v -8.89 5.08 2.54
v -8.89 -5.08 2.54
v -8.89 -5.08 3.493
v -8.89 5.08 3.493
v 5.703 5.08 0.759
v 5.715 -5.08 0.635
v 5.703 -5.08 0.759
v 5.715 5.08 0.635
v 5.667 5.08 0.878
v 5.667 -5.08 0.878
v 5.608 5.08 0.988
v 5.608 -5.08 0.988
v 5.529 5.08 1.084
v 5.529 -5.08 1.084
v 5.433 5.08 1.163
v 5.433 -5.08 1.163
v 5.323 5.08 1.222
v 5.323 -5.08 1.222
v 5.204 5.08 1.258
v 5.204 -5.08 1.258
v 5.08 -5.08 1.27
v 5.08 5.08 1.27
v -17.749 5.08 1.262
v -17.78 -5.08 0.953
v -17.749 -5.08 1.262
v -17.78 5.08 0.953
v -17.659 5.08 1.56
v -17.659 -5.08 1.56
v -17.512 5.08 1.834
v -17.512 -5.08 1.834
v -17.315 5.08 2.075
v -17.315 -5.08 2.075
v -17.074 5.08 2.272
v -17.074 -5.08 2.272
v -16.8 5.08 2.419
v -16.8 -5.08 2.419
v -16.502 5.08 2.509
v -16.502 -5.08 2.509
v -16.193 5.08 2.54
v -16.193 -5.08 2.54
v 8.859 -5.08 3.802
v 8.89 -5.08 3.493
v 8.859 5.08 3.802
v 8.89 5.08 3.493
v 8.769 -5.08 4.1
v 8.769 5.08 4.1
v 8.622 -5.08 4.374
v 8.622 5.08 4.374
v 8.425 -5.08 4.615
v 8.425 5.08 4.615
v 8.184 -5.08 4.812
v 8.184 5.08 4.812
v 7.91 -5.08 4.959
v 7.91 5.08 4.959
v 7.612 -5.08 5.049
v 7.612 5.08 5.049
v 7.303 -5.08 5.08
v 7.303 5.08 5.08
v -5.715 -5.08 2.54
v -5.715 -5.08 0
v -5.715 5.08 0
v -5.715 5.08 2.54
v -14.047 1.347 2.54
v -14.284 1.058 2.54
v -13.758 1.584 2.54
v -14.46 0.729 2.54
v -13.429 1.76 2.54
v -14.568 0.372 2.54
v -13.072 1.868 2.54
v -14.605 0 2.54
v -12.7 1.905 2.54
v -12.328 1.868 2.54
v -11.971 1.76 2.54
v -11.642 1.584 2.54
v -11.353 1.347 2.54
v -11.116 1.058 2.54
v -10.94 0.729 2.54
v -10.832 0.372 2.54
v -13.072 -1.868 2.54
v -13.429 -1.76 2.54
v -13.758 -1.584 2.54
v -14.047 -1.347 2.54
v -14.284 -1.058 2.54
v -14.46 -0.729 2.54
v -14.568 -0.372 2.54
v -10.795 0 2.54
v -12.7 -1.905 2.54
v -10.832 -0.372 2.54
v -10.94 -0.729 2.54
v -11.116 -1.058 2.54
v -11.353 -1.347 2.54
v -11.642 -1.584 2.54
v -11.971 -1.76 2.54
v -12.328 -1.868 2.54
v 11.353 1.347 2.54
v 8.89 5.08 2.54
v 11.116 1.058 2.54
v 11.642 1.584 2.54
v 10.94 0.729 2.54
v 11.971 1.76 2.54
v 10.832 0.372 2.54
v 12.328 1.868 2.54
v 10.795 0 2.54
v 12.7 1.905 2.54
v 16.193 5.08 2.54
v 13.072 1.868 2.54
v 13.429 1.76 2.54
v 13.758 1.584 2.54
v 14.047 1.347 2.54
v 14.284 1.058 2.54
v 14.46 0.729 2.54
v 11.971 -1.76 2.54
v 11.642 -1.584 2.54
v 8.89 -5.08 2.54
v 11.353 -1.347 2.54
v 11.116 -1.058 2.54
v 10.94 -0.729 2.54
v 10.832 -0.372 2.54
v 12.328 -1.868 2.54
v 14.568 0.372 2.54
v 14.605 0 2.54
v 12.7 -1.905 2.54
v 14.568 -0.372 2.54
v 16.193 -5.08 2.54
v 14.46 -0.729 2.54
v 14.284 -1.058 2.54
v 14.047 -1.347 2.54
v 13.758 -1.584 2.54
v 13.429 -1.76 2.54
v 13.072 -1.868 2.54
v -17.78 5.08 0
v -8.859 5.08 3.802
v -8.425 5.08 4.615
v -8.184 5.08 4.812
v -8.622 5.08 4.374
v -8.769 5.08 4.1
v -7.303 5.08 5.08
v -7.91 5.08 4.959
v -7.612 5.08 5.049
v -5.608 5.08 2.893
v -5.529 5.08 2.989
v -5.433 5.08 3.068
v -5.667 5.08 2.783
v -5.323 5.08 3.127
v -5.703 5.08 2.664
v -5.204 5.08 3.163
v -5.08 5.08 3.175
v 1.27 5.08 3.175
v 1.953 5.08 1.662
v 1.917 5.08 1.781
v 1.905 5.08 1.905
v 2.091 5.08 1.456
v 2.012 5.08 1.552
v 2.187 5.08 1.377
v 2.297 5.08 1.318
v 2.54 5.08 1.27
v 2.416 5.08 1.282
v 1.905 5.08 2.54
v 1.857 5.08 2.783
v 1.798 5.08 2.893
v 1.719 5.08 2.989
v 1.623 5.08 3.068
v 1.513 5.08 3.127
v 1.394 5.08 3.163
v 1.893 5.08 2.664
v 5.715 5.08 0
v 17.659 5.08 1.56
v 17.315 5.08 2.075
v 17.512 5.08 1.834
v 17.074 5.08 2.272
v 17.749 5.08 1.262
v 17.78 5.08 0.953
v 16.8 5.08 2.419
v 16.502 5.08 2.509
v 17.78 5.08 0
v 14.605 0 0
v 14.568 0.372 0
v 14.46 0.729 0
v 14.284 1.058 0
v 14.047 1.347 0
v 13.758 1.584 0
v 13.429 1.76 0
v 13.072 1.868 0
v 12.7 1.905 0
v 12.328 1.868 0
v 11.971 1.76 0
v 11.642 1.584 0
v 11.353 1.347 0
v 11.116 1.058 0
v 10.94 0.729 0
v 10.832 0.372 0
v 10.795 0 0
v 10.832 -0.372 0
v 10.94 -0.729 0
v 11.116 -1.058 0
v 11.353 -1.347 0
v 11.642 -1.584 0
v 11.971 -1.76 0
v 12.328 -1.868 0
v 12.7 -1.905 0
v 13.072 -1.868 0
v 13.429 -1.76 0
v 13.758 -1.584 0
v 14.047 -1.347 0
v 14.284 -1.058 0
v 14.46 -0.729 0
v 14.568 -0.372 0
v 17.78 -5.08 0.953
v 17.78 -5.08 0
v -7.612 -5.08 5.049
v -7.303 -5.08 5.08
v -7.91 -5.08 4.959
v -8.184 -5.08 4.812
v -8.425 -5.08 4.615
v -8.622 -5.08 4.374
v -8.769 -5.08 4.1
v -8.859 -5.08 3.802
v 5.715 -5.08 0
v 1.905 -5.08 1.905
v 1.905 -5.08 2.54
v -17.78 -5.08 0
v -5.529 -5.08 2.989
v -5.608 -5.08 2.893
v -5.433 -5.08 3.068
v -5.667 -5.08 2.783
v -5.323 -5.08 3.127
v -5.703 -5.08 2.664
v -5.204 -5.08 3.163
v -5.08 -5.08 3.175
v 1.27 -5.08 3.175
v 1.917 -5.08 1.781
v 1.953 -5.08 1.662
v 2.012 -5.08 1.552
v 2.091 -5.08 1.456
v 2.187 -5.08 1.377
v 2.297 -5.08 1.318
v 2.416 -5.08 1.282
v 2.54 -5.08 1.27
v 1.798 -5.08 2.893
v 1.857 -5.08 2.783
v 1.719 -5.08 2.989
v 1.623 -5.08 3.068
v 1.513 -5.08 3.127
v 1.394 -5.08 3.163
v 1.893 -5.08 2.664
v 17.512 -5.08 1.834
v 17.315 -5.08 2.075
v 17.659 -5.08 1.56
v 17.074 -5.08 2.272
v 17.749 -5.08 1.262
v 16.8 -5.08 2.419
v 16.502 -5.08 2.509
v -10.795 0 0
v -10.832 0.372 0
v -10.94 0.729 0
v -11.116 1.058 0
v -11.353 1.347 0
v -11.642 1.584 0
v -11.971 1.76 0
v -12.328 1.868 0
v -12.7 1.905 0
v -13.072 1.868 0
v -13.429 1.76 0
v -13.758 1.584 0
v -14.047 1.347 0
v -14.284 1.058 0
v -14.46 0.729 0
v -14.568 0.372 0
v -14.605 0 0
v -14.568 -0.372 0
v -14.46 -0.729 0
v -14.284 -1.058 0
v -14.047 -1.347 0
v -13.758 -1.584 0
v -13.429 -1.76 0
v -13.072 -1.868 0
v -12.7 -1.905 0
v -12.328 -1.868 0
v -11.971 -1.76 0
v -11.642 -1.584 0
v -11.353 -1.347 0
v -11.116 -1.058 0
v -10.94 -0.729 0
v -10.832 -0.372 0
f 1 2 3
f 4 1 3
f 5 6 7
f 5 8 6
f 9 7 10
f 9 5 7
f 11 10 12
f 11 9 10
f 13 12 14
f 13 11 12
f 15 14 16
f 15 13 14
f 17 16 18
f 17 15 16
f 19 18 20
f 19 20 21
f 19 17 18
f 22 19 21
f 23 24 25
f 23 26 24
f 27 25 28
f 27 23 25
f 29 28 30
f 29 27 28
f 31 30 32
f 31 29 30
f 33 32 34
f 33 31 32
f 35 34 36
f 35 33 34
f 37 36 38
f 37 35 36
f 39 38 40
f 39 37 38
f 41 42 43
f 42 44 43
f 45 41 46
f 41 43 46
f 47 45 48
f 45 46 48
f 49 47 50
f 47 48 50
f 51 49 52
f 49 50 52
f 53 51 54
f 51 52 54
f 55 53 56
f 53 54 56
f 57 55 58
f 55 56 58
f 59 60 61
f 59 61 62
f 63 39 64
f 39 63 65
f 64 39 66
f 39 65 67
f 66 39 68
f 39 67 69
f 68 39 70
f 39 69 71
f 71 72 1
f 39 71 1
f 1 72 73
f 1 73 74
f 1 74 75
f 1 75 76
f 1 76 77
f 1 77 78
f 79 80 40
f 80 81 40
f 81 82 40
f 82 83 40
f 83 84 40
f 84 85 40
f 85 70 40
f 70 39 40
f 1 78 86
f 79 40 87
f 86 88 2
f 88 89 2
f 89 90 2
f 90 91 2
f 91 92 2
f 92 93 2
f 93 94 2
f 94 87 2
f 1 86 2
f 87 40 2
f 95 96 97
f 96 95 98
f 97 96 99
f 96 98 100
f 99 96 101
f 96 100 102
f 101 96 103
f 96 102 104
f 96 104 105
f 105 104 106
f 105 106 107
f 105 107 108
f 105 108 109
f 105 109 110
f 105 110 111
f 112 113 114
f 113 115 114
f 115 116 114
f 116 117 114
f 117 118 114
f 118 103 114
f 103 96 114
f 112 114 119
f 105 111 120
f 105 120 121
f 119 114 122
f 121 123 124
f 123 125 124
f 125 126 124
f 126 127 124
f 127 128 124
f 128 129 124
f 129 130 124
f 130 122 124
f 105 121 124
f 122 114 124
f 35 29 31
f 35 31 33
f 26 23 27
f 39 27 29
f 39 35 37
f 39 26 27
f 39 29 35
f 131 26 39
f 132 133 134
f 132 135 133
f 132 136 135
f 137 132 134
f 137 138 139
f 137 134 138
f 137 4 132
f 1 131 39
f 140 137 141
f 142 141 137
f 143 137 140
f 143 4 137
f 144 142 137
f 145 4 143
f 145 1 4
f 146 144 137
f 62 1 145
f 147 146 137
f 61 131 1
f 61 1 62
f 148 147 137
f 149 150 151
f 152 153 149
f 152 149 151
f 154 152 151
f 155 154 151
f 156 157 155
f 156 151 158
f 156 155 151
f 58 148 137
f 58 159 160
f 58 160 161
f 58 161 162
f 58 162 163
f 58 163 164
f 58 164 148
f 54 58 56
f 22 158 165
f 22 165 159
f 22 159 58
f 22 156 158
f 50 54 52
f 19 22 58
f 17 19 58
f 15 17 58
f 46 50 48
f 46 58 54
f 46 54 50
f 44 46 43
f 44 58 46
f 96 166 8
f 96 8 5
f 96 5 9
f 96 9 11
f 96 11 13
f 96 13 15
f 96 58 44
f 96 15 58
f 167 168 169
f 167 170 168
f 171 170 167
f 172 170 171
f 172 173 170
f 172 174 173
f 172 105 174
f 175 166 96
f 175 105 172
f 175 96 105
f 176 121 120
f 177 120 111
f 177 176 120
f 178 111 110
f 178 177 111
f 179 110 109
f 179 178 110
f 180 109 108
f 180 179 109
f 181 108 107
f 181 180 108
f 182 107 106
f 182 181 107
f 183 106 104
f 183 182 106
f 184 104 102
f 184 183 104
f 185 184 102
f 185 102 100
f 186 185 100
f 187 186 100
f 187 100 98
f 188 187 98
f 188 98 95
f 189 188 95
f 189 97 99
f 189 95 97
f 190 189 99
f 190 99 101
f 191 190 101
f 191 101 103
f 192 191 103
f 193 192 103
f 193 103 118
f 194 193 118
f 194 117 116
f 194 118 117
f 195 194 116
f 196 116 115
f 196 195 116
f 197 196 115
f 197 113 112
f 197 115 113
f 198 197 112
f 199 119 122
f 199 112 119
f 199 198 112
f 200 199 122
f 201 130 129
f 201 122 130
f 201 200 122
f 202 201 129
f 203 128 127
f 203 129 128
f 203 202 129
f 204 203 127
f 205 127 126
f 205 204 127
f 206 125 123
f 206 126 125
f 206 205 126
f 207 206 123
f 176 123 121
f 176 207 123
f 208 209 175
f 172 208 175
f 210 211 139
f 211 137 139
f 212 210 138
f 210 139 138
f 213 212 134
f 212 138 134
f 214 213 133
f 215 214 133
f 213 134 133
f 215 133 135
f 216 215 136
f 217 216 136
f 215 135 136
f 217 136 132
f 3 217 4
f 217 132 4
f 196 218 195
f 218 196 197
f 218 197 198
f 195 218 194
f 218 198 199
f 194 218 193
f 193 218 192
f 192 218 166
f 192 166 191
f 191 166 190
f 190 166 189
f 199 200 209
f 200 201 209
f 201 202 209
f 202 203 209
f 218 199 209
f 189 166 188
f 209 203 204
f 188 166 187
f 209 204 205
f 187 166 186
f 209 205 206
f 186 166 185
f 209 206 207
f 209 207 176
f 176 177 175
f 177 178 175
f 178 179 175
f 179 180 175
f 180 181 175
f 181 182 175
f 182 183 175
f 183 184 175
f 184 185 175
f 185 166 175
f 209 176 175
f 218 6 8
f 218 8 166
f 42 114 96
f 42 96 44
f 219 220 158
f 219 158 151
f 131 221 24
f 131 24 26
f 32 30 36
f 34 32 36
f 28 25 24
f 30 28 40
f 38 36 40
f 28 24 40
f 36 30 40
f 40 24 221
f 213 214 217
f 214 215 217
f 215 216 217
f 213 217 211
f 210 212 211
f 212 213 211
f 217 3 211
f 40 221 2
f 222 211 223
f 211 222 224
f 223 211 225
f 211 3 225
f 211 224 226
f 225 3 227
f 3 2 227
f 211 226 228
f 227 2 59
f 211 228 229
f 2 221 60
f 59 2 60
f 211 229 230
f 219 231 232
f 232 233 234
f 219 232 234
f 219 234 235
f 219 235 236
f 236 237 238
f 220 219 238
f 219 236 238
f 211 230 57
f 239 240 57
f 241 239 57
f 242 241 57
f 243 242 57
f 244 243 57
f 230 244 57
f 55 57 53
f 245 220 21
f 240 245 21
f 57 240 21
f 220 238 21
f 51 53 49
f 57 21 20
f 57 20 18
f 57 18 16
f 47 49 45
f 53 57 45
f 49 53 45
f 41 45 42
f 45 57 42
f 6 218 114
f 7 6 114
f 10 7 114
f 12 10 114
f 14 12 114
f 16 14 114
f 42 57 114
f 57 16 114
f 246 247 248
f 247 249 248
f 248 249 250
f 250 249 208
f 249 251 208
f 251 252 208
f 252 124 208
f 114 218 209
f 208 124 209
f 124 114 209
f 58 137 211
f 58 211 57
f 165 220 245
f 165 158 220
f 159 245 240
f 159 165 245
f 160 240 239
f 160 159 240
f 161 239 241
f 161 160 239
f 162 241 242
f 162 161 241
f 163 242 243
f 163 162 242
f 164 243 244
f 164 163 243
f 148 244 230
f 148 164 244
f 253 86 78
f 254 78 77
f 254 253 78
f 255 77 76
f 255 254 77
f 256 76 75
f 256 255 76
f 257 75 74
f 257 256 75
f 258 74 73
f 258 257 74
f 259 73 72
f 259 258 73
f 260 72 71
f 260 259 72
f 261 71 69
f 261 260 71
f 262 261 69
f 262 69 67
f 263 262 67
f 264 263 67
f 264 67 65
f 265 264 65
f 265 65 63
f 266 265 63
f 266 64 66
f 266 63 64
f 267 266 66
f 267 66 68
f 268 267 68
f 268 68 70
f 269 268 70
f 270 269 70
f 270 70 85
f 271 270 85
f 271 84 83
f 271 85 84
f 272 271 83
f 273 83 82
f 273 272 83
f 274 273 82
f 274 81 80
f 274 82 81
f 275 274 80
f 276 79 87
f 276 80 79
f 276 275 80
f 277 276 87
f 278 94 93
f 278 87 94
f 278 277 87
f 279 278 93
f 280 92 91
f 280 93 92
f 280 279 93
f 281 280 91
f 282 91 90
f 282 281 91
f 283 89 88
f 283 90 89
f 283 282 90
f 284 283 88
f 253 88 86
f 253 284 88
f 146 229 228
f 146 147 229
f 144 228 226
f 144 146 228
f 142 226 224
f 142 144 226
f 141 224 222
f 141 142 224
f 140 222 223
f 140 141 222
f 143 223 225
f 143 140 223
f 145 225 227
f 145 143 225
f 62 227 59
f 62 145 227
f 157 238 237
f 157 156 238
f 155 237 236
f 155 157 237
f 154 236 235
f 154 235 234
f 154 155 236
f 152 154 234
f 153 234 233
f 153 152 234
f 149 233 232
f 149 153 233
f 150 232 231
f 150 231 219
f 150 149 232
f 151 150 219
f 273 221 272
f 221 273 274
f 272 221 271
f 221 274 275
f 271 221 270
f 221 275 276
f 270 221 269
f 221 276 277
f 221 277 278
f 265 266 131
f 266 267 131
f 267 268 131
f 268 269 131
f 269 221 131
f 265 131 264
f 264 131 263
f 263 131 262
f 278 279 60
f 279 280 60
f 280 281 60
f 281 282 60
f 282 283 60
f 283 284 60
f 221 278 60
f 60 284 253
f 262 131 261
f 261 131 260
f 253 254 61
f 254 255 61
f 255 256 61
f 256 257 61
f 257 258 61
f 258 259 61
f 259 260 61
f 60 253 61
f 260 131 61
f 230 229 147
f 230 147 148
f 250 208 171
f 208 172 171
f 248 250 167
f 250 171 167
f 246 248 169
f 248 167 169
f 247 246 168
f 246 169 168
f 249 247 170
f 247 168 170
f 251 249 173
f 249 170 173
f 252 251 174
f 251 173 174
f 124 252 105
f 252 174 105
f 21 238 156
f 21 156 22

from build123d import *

# Parameters (mm, degrees)
SKETCH1_W           = 35.56
SKETCH1_H           = 10.16
SKETCH1_R           = 1.905
BOSS_EXTRUDE1_DEPTH = 5.08
SKETCH2_W           = 8.89
SKETCH2_H           = 2.54
CUT_EXTRUDE1_DEPTH  = 22.098824612
FILLET1_R           = 1.5875
FILLET2_R           = 0.635


with BuildPart() as part:
    # Sketch1 → Boss-Extrude1 (new body)
    with BuildSketch(Plane.XY):
        Rectangle(SKETCH1_W, SKETCH1_H)
        with Locations((-12.7, 0)):
            Circle(SKETCH1_R, mode=Mode.SUBTRACT)
        with Locations((12.7, 0)):
            Circle(SKETCH1_R, mode=Mode.SUBTRACT)
    extrude(amount=BOSS_EXTRUDE1_DEPTH)

    # Sketch2 → Cut-Extrude1 (cut, through all)
    with BuildSketch(Plane.XZ.offset(5.08)):
        Polygon((0, 0), (-5.715, 0), (-5.715, 3.175), (1.905, 3.175), (1.905, 1.27), (5.715, 1.27), (5.715, 0), align=None)
        with Locations((-13.335, 3.81)):
            Rectangle(SKETCH2_W, SKETCH2_H)
        with Locations((13.335, 3.81)):
            Rectangle(SKETCH2_W, SKETCH2_H)
    extrude(amount=-CUT_EXTRUDE1_DEPTH, mode=Mode.SUBTRACT)

    # Fillet1
    fillet1_edges = [part.edges().sort_by_distance(p)[0] for p in [
        (-17.78, 0, 2.54),
        (-8.89, 0, 5.08),
        (8.89, 0, 5.08),
        (17.78, 0, 2.54),
    ]]
    fillet(fillet1_edges, radius=FILLET1_R)

    # Fillet2
    fillet2_edges = [part.edges().sort_by_distance(p)[0] for p in [
        (-5.715, 0, 3.175),
        (1.905, 0, 3.175),
        (1.905, 0, 1.27),
        (5.715, 0, 1.27),
    ]]
    fillet(fillet2_edges, radius=FILLET2_R)


solid = part.part
